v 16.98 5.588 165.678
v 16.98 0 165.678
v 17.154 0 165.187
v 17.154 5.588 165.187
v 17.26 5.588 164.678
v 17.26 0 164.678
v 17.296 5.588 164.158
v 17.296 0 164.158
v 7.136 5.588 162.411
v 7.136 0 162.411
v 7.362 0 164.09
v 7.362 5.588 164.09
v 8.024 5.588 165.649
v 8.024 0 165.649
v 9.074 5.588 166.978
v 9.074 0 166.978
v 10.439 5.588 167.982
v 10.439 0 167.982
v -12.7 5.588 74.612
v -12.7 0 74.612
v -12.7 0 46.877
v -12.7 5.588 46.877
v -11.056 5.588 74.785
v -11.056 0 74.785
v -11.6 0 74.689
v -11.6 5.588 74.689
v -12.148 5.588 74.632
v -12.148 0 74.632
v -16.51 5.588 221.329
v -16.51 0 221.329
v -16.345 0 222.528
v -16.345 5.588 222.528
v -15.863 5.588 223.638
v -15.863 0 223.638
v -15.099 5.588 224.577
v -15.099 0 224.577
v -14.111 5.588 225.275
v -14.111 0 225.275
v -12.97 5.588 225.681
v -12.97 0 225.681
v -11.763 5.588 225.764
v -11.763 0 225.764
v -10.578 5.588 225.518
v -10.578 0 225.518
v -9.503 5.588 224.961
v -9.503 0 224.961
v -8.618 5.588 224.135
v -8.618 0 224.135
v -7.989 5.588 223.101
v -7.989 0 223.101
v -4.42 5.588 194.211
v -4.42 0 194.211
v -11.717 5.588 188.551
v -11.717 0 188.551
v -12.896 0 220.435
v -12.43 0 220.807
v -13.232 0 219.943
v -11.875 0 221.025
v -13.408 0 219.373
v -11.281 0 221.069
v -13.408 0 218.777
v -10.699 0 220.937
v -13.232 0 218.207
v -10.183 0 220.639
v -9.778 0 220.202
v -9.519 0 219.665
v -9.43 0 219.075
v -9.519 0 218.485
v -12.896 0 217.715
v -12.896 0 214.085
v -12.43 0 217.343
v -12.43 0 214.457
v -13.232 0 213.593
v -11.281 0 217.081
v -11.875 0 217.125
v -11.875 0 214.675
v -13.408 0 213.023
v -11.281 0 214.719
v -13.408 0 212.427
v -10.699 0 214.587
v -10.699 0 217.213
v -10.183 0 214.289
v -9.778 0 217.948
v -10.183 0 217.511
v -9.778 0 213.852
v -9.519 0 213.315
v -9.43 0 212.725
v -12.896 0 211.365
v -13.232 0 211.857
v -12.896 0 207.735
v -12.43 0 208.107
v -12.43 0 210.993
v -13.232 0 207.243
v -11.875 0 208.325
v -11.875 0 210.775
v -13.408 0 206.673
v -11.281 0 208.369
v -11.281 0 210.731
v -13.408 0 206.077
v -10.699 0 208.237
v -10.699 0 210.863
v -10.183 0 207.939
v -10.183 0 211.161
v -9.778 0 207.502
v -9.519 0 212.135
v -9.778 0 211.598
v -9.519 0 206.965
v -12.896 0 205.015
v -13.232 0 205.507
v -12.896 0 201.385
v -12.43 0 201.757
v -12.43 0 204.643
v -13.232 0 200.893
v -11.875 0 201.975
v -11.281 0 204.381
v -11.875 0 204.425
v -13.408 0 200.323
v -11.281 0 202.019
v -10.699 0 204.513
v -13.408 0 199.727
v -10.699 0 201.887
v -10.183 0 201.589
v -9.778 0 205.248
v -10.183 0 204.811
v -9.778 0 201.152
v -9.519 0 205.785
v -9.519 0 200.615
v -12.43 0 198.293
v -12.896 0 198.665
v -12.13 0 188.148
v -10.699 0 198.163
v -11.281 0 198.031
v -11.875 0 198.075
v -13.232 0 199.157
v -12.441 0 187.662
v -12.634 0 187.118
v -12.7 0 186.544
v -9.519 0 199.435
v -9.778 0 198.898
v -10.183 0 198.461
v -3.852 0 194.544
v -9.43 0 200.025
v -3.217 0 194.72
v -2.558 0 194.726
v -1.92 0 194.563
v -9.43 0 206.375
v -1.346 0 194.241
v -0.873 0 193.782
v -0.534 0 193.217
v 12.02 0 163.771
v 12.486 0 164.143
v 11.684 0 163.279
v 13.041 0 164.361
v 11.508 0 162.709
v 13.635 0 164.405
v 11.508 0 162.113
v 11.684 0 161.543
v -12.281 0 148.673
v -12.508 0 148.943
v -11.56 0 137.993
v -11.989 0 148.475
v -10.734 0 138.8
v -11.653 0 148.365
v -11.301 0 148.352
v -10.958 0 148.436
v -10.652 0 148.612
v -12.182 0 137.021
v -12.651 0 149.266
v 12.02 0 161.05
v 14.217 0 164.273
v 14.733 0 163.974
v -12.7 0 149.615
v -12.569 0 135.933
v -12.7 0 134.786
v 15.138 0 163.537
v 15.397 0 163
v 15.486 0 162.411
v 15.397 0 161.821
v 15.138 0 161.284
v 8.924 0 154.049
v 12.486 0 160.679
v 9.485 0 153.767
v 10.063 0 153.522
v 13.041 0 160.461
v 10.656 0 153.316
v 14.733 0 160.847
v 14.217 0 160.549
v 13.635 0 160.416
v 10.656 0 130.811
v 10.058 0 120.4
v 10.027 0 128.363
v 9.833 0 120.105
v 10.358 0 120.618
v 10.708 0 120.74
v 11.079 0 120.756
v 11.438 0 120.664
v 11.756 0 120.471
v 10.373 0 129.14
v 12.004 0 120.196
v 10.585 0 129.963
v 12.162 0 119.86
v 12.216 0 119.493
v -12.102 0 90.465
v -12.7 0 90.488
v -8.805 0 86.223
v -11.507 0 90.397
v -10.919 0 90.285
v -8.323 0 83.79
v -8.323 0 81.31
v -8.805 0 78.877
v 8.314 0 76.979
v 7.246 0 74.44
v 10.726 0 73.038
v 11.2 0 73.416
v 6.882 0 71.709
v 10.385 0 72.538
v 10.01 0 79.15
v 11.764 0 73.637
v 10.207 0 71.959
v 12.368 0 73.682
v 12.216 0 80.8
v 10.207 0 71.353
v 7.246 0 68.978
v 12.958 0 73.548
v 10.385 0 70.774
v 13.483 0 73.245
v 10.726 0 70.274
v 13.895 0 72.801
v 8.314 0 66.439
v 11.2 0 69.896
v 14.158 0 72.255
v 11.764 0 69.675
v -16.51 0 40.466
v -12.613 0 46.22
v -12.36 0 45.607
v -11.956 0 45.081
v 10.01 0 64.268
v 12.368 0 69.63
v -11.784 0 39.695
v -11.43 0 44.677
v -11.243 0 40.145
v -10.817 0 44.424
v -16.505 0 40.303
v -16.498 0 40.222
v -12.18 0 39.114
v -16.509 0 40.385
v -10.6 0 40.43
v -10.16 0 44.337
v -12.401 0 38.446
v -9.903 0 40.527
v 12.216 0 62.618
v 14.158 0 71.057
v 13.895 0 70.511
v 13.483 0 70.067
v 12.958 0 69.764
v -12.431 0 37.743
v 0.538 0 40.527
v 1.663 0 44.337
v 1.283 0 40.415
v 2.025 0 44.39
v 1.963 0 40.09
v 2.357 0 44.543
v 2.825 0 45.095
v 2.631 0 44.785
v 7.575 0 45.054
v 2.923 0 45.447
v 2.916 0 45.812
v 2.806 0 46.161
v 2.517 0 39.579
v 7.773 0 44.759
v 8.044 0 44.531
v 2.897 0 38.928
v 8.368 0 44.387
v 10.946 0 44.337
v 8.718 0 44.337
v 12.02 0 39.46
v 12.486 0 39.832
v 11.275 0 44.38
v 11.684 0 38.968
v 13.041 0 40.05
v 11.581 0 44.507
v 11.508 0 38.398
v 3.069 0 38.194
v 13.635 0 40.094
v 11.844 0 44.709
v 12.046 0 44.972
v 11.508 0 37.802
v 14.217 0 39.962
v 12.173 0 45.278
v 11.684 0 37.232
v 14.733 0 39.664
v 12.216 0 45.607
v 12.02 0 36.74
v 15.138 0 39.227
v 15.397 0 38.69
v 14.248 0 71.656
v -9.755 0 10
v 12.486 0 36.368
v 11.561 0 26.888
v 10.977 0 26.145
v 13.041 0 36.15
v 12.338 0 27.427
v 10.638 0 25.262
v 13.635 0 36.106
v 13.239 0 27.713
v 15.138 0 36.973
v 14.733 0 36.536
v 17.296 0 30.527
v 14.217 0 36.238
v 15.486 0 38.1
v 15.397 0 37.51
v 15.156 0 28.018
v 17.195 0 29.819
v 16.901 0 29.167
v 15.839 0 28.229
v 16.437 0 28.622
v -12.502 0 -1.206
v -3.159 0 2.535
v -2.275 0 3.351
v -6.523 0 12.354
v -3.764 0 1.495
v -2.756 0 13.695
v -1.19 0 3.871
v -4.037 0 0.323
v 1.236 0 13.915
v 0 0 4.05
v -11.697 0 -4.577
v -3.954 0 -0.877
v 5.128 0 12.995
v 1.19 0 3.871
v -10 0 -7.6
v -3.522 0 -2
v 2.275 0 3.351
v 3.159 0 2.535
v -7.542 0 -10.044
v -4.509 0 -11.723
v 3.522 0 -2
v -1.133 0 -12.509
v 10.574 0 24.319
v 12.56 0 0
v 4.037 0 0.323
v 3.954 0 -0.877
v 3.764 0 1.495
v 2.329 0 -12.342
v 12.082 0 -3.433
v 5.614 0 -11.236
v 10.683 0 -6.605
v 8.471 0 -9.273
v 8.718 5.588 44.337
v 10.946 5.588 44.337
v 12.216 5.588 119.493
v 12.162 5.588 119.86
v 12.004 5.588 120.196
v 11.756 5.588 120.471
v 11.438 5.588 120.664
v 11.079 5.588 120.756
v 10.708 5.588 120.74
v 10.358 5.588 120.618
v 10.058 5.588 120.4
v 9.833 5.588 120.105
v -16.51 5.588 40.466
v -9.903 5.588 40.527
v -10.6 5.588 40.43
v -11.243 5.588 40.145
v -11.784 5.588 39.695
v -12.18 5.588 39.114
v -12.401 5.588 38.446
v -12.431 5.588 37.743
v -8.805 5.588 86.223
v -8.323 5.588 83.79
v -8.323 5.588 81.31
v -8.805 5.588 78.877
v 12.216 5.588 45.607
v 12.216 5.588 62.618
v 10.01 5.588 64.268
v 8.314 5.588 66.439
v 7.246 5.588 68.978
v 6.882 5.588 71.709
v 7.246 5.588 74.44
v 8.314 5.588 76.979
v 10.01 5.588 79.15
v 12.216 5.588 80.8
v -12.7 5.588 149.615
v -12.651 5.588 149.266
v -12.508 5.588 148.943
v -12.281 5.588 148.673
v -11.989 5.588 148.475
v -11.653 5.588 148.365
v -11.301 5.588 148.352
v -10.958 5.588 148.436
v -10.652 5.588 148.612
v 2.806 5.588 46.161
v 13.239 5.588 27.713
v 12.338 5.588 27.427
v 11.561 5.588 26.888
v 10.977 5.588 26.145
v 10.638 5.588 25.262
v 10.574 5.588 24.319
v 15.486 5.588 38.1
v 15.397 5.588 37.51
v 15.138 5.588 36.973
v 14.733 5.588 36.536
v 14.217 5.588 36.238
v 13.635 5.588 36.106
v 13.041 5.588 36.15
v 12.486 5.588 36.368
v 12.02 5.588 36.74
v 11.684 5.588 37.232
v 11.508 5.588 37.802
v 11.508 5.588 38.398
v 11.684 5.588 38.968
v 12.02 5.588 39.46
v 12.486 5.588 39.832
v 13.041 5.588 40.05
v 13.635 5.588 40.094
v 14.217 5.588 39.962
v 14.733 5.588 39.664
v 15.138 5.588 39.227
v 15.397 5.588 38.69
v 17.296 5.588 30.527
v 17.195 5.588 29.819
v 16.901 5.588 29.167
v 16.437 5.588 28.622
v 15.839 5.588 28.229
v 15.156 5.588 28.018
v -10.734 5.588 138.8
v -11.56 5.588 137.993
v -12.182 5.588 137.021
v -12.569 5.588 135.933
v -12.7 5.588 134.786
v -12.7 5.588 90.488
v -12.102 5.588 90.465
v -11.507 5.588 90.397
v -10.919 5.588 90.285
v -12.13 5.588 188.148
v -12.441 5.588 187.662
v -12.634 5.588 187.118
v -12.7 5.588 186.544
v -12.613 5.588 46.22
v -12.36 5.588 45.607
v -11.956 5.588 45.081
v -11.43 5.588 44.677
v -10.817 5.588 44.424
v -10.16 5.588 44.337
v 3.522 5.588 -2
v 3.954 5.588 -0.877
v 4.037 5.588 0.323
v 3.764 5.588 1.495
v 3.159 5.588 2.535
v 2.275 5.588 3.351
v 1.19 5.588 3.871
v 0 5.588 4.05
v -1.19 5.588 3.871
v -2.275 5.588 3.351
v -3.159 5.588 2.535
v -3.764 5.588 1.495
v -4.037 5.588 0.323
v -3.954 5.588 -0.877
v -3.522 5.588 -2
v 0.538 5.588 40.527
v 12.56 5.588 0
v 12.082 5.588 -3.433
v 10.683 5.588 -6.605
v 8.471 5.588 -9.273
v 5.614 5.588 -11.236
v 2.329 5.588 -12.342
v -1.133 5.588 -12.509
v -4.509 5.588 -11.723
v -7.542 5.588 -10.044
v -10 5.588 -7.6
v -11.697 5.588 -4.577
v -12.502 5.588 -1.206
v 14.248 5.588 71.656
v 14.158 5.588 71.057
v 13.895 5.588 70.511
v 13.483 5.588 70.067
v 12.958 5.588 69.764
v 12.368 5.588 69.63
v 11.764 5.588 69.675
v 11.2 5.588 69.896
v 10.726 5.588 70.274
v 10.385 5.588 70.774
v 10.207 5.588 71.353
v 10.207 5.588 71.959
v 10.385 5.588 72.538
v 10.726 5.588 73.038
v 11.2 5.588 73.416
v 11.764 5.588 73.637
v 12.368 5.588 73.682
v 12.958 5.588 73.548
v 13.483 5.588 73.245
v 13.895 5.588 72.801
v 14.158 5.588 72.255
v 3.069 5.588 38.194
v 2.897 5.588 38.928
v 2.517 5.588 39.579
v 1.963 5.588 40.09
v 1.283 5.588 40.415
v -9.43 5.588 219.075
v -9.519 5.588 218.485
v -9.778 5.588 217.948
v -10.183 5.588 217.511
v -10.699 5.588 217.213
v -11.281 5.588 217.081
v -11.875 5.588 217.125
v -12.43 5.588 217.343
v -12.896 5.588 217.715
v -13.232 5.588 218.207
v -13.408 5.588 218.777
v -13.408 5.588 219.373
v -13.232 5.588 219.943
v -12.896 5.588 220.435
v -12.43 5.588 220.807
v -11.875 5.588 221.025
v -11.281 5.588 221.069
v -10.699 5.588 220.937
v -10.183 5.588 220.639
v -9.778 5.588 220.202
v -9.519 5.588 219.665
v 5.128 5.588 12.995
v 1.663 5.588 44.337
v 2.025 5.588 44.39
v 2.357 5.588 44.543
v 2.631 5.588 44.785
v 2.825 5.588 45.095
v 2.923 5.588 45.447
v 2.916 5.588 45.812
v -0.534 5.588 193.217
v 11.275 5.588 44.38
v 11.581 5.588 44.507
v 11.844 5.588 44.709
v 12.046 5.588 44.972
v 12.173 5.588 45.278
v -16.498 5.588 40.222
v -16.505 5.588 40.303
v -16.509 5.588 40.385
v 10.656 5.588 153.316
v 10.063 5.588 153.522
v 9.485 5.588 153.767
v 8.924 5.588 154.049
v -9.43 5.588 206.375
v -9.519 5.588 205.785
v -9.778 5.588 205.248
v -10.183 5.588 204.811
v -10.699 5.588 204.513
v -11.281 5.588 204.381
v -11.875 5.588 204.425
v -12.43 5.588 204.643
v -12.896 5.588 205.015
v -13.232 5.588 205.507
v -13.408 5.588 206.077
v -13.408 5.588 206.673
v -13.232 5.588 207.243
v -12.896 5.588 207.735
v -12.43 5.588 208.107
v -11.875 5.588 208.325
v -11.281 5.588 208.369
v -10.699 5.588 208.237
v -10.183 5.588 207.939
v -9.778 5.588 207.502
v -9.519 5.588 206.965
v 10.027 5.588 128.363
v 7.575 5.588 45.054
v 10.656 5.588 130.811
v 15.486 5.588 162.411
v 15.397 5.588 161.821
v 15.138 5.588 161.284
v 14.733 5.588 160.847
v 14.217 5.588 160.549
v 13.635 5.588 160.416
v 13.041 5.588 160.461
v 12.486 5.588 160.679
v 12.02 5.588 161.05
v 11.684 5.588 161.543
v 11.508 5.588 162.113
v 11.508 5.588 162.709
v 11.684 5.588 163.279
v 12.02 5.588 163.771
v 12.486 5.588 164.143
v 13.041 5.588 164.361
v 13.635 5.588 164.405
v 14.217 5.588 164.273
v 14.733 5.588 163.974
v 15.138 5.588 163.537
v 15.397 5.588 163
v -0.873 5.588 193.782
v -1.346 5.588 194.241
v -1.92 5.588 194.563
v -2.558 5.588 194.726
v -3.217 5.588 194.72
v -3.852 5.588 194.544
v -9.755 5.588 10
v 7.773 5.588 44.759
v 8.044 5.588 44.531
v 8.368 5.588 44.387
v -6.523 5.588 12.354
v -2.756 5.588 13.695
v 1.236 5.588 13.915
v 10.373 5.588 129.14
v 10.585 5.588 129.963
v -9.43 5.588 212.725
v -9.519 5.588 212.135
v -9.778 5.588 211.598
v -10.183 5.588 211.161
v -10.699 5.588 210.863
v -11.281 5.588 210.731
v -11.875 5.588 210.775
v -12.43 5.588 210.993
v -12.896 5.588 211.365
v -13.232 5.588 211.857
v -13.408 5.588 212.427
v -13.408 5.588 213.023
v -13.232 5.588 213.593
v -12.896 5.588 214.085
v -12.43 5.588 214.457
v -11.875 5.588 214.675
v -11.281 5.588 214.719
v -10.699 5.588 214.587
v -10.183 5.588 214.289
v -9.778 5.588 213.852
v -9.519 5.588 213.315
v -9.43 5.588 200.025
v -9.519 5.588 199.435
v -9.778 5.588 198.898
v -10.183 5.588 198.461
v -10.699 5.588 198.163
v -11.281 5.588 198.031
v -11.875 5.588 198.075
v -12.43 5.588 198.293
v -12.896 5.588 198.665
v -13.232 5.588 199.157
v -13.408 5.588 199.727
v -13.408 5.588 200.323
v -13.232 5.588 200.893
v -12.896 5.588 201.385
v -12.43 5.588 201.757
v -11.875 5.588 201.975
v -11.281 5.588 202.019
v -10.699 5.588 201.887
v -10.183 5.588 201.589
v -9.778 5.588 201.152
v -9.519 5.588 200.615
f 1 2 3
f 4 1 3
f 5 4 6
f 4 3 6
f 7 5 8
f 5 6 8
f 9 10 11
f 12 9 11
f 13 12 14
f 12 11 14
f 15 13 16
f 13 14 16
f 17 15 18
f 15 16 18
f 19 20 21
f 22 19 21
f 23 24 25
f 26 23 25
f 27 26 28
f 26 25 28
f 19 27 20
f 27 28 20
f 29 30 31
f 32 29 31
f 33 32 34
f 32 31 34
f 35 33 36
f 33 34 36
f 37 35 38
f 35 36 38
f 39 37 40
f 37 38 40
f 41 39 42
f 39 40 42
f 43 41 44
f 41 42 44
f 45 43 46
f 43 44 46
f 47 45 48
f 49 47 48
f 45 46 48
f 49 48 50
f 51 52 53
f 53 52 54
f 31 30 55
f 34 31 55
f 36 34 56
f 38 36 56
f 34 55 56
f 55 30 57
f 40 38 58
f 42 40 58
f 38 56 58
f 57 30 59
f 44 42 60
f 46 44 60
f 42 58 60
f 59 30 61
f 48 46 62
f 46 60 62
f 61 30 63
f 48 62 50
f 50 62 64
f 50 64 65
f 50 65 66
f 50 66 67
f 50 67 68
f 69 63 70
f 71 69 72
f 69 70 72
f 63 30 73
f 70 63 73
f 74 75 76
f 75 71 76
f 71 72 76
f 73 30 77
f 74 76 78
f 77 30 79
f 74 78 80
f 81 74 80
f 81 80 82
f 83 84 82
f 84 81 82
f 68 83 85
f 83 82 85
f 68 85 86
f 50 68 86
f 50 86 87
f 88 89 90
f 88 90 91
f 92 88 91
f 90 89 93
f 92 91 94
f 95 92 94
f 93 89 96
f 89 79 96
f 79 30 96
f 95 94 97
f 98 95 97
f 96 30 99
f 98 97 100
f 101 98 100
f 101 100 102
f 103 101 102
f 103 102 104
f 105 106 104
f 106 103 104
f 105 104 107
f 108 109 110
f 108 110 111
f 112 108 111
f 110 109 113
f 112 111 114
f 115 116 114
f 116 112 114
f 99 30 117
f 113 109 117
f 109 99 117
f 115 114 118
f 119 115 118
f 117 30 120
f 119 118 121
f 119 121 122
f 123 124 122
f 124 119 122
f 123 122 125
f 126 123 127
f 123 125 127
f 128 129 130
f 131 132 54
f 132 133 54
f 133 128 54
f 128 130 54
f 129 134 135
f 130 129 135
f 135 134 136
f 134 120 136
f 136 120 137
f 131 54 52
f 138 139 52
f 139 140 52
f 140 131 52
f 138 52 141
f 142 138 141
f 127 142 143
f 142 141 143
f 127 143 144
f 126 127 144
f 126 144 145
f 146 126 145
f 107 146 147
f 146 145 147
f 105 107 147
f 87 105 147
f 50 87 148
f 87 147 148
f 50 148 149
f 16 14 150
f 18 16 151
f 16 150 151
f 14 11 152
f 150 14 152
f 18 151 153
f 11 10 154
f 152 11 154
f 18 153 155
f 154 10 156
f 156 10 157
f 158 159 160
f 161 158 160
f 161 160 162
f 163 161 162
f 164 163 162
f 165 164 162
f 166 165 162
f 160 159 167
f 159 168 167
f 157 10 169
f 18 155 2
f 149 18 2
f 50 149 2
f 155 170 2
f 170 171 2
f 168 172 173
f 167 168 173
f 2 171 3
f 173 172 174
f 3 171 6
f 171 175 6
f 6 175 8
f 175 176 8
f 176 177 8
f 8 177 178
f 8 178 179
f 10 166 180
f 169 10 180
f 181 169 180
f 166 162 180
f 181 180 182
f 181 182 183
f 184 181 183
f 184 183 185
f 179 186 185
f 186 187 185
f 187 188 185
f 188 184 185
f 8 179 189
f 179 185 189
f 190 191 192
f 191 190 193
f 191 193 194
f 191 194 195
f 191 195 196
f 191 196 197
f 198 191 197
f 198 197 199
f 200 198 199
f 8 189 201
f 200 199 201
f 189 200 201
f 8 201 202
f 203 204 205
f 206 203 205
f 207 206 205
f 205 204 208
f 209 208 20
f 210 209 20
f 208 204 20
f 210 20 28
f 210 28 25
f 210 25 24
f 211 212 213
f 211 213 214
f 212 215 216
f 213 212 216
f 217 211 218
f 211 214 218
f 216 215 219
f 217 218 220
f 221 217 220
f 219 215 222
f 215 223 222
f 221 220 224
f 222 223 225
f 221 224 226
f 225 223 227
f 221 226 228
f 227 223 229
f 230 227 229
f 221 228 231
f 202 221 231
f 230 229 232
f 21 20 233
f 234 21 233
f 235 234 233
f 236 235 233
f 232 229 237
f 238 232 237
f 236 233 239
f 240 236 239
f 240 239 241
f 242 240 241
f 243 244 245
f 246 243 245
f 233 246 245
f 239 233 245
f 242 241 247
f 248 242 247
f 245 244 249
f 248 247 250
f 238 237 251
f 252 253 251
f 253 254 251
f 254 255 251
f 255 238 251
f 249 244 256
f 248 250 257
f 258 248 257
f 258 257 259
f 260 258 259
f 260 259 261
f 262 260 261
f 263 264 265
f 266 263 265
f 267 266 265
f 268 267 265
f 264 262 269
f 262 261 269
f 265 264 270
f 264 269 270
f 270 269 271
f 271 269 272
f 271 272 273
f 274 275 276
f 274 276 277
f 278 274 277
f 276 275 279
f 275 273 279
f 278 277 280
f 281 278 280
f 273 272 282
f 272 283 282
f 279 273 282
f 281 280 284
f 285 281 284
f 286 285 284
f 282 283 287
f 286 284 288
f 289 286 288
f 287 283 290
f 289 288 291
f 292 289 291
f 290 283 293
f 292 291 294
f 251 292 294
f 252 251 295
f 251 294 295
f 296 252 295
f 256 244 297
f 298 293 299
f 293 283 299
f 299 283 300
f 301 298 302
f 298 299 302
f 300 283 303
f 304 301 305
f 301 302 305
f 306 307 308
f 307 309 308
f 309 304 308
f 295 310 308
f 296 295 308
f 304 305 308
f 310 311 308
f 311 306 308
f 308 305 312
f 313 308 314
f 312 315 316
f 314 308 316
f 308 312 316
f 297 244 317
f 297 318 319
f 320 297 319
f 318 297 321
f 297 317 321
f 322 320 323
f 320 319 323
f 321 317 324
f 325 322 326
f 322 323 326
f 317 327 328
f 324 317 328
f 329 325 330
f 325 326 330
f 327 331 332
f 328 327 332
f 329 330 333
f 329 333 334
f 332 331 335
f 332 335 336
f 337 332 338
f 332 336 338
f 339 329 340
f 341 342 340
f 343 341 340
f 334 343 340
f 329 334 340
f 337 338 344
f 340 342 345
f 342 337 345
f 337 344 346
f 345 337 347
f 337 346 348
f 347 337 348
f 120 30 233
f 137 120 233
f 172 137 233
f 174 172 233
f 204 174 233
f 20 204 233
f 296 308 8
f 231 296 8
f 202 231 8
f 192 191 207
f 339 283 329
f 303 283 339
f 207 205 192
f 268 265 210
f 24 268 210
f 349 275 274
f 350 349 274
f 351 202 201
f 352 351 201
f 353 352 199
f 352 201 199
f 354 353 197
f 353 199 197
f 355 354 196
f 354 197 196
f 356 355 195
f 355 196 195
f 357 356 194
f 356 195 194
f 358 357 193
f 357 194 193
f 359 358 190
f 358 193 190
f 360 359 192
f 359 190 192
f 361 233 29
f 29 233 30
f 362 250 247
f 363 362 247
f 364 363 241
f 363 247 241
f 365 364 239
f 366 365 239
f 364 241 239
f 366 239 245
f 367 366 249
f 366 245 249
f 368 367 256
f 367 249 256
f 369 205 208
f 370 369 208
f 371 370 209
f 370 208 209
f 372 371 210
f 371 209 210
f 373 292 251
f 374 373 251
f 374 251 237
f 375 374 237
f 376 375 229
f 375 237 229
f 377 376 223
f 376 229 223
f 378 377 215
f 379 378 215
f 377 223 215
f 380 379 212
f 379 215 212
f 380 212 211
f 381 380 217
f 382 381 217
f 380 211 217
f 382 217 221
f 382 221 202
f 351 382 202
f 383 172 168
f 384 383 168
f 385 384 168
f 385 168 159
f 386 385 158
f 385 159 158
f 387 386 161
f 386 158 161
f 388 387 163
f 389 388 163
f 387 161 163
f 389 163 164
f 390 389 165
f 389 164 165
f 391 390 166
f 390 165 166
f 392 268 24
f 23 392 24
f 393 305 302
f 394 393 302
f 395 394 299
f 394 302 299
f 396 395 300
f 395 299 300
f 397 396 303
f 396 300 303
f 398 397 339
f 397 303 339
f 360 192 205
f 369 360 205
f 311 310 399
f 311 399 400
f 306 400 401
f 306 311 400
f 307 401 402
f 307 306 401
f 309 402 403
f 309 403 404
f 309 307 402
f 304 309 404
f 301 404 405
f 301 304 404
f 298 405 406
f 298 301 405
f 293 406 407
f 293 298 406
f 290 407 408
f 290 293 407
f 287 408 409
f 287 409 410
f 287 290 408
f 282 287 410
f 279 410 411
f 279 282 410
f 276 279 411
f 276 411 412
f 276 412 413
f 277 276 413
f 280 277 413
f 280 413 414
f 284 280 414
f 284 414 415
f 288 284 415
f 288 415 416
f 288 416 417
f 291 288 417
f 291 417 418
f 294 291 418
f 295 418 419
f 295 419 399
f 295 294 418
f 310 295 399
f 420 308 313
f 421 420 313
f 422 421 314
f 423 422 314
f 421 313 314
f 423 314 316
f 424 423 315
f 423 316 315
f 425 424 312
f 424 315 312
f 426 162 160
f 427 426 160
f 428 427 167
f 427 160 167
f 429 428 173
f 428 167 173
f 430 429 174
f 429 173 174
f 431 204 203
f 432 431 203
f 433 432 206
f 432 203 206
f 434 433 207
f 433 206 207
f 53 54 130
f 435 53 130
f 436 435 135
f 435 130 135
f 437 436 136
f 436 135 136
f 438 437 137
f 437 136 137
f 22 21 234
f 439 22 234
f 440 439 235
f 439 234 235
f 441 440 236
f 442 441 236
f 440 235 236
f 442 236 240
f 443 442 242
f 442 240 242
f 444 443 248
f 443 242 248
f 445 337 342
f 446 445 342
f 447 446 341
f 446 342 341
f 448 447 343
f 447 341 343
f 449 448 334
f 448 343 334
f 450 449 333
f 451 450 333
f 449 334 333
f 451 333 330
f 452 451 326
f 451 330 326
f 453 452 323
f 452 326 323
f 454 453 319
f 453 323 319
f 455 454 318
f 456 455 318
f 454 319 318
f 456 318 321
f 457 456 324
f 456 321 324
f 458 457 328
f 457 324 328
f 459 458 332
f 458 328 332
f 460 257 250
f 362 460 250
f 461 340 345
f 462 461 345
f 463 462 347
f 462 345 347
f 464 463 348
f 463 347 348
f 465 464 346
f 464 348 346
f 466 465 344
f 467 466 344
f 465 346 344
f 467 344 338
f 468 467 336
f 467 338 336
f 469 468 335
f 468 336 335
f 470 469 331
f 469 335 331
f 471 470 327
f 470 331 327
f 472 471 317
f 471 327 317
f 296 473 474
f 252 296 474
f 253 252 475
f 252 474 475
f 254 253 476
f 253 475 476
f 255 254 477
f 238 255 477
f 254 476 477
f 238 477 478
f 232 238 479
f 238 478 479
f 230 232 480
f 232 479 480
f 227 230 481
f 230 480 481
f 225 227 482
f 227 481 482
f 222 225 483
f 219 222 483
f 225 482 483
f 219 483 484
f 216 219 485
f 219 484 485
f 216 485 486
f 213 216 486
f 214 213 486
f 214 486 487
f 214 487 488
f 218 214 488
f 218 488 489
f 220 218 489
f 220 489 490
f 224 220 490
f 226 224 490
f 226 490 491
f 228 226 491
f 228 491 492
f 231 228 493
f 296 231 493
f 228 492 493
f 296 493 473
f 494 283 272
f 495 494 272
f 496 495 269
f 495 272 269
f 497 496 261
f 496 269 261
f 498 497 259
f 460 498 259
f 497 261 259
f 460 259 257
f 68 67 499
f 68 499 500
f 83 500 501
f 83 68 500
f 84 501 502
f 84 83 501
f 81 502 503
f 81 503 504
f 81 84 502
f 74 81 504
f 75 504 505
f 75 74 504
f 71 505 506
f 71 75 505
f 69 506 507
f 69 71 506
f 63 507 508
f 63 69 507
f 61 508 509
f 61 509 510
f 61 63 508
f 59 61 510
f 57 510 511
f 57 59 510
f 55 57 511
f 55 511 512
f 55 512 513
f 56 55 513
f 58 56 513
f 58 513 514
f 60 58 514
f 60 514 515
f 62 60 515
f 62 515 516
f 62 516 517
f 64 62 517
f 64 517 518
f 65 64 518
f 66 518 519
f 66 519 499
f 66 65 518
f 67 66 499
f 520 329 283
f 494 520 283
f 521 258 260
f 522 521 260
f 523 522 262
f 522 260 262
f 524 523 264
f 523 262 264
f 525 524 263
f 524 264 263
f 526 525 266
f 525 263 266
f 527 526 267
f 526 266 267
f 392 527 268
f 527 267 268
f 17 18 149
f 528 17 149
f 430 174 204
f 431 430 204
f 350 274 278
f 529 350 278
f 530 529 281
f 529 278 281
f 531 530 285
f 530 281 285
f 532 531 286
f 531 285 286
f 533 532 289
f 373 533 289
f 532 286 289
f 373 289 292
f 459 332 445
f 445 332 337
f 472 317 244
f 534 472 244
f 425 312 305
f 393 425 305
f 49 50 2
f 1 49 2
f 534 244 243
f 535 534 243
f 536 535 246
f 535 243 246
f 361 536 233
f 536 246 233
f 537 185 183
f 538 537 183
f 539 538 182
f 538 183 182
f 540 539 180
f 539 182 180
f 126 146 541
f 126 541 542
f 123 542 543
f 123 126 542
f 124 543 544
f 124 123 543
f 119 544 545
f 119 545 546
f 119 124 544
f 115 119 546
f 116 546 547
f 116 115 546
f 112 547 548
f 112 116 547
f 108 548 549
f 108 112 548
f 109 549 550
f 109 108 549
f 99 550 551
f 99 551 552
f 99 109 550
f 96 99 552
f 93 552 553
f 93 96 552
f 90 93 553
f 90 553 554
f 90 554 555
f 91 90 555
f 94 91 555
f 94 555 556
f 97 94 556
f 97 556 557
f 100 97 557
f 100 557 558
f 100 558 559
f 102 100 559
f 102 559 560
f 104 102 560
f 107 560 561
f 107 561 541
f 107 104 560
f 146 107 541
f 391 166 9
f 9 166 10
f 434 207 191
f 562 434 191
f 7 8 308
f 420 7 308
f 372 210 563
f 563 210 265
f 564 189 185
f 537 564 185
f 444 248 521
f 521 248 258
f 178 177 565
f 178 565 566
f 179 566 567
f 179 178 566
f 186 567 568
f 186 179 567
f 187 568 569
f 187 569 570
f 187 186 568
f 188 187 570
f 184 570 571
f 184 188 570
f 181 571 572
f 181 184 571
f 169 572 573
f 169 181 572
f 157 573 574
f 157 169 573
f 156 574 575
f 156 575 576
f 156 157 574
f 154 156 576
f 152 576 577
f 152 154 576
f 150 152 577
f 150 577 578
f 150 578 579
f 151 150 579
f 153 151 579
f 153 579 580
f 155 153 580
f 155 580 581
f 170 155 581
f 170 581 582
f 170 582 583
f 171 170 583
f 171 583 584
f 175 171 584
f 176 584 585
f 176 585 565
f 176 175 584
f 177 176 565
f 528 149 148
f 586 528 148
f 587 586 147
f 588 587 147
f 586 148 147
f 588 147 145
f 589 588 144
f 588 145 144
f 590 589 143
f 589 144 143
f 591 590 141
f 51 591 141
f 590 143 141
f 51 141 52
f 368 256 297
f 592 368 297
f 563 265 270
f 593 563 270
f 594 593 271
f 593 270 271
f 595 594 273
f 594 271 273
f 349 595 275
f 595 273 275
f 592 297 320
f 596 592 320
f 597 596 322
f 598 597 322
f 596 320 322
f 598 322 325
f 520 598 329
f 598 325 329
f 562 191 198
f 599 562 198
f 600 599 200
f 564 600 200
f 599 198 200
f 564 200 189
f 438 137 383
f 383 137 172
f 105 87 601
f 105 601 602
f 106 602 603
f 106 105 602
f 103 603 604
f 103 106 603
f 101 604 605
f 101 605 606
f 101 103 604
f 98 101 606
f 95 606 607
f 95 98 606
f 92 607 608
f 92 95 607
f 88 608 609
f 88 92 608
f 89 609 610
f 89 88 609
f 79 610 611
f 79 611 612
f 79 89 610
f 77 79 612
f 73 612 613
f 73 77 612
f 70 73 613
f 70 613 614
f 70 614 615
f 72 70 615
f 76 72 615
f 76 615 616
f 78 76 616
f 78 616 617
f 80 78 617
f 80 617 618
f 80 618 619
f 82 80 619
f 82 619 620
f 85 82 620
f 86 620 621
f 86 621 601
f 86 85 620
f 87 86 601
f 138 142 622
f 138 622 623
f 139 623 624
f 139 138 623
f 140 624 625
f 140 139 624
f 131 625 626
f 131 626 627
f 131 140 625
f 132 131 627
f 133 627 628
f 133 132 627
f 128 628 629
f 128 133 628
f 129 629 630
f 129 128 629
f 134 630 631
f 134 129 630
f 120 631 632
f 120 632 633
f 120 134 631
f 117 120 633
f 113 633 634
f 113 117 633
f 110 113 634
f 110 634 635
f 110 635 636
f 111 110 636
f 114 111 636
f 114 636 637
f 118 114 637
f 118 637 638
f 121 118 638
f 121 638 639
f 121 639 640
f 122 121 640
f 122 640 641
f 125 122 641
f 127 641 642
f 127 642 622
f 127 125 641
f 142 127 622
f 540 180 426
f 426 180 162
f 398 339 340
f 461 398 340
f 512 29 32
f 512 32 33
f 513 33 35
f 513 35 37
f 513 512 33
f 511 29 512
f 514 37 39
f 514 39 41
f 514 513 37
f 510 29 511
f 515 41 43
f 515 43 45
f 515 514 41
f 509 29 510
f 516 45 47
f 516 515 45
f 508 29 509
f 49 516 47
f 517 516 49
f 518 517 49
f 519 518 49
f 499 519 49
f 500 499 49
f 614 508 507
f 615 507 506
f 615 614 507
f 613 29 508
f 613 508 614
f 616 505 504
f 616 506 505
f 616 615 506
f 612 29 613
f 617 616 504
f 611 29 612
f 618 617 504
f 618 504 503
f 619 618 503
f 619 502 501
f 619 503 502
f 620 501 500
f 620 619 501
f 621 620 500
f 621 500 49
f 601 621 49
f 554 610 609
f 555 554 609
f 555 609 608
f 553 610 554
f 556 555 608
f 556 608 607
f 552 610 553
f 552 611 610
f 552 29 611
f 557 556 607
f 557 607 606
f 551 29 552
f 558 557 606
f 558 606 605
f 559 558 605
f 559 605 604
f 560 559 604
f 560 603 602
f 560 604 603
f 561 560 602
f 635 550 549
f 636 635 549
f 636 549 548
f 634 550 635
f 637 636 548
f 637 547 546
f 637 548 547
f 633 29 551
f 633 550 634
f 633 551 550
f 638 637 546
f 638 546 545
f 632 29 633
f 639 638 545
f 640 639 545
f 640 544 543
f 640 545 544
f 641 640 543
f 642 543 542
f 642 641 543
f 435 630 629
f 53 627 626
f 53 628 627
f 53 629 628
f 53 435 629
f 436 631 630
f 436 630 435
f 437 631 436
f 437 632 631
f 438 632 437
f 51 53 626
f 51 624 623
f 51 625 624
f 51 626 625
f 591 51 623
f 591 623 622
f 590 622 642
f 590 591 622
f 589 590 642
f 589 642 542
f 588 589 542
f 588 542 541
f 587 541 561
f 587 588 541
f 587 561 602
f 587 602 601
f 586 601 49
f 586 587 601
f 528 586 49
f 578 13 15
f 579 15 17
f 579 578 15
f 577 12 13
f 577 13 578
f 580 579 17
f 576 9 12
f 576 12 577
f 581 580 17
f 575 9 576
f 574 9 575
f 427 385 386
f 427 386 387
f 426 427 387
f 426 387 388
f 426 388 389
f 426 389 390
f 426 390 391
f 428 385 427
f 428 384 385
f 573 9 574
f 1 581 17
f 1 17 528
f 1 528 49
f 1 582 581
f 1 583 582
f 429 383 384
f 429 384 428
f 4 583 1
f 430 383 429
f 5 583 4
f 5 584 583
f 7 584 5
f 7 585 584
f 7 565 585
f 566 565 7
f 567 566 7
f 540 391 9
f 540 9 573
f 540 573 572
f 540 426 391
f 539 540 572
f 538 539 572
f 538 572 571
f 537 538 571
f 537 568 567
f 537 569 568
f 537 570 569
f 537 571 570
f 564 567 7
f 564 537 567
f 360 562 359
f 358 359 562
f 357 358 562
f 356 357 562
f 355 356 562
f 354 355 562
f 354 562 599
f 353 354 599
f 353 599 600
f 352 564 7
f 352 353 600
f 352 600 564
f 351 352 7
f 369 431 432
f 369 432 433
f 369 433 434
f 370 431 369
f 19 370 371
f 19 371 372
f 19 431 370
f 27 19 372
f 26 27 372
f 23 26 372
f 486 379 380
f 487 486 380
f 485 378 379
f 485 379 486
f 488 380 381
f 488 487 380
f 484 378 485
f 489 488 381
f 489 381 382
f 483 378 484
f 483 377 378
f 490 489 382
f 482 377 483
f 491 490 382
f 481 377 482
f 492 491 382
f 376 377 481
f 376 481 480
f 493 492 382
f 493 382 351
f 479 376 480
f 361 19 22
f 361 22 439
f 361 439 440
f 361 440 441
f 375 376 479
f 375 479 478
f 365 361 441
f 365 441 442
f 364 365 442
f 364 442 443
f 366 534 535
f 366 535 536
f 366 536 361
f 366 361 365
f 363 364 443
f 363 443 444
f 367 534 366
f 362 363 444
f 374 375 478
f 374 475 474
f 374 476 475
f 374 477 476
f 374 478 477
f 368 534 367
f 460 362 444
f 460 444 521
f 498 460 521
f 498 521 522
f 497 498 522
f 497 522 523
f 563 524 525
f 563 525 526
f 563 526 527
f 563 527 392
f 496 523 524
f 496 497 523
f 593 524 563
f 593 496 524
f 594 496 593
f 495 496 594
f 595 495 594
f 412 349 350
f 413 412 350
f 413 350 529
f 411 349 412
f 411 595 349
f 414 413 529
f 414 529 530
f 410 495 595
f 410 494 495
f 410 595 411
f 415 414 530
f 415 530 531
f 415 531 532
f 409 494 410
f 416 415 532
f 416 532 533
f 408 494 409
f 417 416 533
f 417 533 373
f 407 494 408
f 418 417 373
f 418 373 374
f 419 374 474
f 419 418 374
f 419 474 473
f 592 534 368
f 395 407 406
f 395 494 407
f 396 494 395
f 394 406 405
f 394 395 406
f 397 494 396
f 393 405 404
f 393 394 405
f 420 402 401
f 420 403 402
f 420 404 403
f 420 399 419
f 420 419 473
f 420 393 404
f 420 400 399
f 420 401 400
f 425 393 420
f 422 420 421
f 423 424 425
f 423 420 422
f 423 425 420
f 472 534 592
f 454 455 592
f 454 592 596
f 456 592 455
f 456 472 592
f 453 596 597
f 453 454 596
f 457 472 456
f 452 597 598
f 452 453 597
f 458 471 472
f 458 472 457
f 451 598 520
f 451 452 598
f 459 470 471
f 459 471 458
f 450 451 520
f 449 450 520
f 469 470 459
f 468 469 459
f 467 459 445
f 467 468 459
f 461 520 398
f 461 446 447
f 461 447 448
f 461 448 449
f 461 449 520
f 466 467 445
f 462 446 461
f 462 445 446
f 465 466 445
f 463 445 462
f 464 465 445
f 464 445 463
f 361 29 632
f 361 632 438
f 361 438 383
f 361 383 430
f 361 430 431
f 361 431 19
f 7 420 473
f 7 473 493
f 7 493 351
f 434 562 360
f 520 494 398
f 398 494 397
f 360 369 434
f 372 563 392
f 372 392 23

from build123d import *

# Parameters (mm, degrees)
SKETCH2_R           = 2
SKETCH2_R_2         = 1.999999991
BOSS_EXTRUDE1_DEPTH = 5.588
SKETCH7_R           = 2.032
CUT_EXTRUDE1_DEPTH  = 5.588


with BuildPart() as part:
    # Sketch2 → Boss-Extrude1 (new body)
    with BuildSketch(Plane(origin=(0, 0, 0), x_dir=(1, 0, 0), z_dir=(0, 1, 0))):
        with BuildLine():
            ThreePointArc((17.295902343, -30.526810701), (16.688093876, -28.878103365), (15.15555913, -28.018449791))
            Line((15.15555913, -28.018449791), (13.238676936, -27.713033224))
            ThreePointArc((13.238676936, -27.713033224), (11.241051513, -26.538356195), (10.573787778, -24.319092227))
            Line((10.573787778, -24.319092227), (12.5603, 0))
            ThreePointArc((12.5603, 0), (0.603657177, 12.545785512), (-12.502275592, 1.2059192))
            Line((-12.502275592, 1.2059192), (-16.498266045, -40.222207921))
            ThreePointArc((-16.498266045, -40.222207921), (-16.507064815, -40.344000039), (-16.51, -40.466074291))
            Line((-16.51, -40.466074291), (-16.51, -221.328861788))
            ThreePointArc((-16.51, -221.328861788), (-12.970187584, -225.680718913), (-7.988667969, -223.101301399))
            Line((-7.988667969, -223.101301399), (16.979901226, -165.677523619))
            ThreePointArc((16.979901226, -165.677523619), (17.216065593, -164.934164738), (17.295902343, -164.158289667))
            Line((17.295902343, -164.158289667), (17.295902343, -30.526810701))
        make_face()
        with Locations((-11.43, -219.075)):
            Circle(SKETCH2_R, mode=Mode.SUBTRACT)
        with Locations((-11.43, -212.725)):
            Circle(SKETCH2_R, mode=Mode.SUBTRACT)
        with Locations((-11.43, -206.375)):
            Circle(SKETCH2_R, mode=Mode.SUBTRACT)
        with Locations((-11.43, -200.025)):
            Circle(SKETCH2_R, mode=Mode.SUBTRACT)
        with BuildLine():
            ThreePointArc((7.135902343, -162.410770806), (8.023611961, -165.648962244), (10.438542905, -167.981776143))
            Line((10.438542905, -167.981776143), (-0.534170778, -193.217289931))
            ThreePointArc((-0.534170778, -193.217289931), (-2.234040931, -194.665234867), (-4.420389569, -194.211381682))
            Line((-4.420389569, -194.211381682), (-11.716886202, -188.551043102))
            ThreePointArc((-11.716886202, -188.551043102), (-12.441018517, -187.661516081), (-12.7, -186.544128716))
            Line((-12.7, -186.544128716), (-12.7, -149.615408258))
            ThreePointArc((-12.7, -149.615408258), (-11.988693683, -148.474898999), (-10.651556899, -148.611951065))
            Line((-10.651556899, -148.611951065), (7.135902343, -162.410770806))
        make_face(mode=Mode.SUBTRACT)
        with BuildLine():
            ThreePointArc((10.656105825, -153.315833936), (9.771695946, -153.639779081), (8.923603828, -154.049487576))
            Line((8.923603828, -154.049487576), (-10.733772403, -138.80005889))
            ThreePointArc((-10.733772403, -138.80005889), (-12.182037035, -137.021004847), (-12.7, -134.786230117))
            Line((-12.7, -134.786230117), (-12.7, -90.4875))
            ThreePointArc((-12.7, -90.4875), (-11.803536501, -90.43671411), (-10.918544548, -90.285006317))
            Line((-10.918544548, -90.285006317), (10.027134635, -128.362607876))
            ThreePointArc((10.027134635, -128.362607876), (10.49635106, -129.547067395), (10.656105825, -130.811024207))
            Line((10.656105825, -130.811024207), (10.656105825, -153.315833936))
        make_face(mode=Mode.SUBTRACT)
        with Locations((13.485902343, -162.410770806)):
            Circle(SKETCH2_R, mode=Mode.SUBTRACT)
        with BuildLine():
            Line((-10.16, -44.337182032), (1.663048834, -44.337182032))
            ThreePointArc((1.663048834, -44.337182032), (2.739129831, -44.932682449), (2.806066447, -46.160725831))
            Line((2.806066447, -46.160725831), (-11.055993219, -74.784618621))
            ThreePointArc((-11.055993219, -74.784618621), (-11.873503915, -74.655646925), (-12.7, -74.6125))
            Line((-12.7, -74.6125), (-12.7, -46.877182032))
            ThreePointArc((-12.7, -46.877182032), (-11.956051224, -45.081130808), (-10.16, -44.337182032))
        make_face(mode=Mode.SUBTRACT)
        with BuildLine():
            ThreePointArc((-9.903213406, -40.527182032), (-11.783508673, -39.694838236), (-12.431479451, -37.743315662))
            Line((-12.431479451, -37.743315662), (-9.755434212, -9.99962016))
            ThreePointArc((-9.755434212, -9.99962016), (-2.756273581, -13.695395429), (5.127655889, -12.99492382))
            Line((5.127655889, -12.99492382), (3.069264048, -38.19397392))
            ThreePointArc((3.069264048, -38.19397392), (2.259083254, -39.854914801), (0.537695935, -40.527182032))
            Line((0.537695935, -40.527182032), (-9.903213406, -40.527182032))
        make_face(mode=Mode.SUBTRACT)
        with BuildLine():
            Line((-3.521718331, 2), (3.521718331, 2))
            ThreePointArc((3.521718331, 2), (0, -4.05), (-3.521718331, 2))
        make_face(mode=Mode.SUBTRACT)
        with BuildLine():
            ThreePointArc((-8.804706991, -86.222769023), (-8.262040897, -82.55), (-8.804706991, -78.877230977))
            Line((-8.804706991, -78.877230977), (7.575478058, -45.053638233))
            ThreePointArc((7.575478058, -45.053638233), (8.043996088, -44.531101035), (8.718495671, -44.337182032))
            Line((8.718495671, -44.337182032), (10.945902343, -44.337182032))
            ThreePointArc((10.945902343, -44.337182032), (11.843927955, -44.70915642), (12.215902343, -45.607182032))
            Line((12.215902343, -45.607182032), (12.215902343, -62.618124667))
            ThreePointArc((12.215902343, -62.618124667), (6.881902343, -71.709053992), (12.215902343, -80.799983318))
            Line((12.215902343, -80.799983318), (12.215902343, -119.492817968))
            ThreePointArc((12.215902343, -119.492817968), (11.261891546, -120.722879277), (9.83314514, -120.104922051))
            Line((9.83314514, -120.104922051), (-8.804706991, -86.222769023))
        make_face(mode=Mode.SUBTRACT)
        with Locations((13.485902343, -38.1)):
            Circle(SKETCH2_R_2, mode=Mode.SUBTRACT)
    extrude(amount=BOSS_EXTRUDE1_DEPTH)

    # Sketch7 → Cut-Extrude1 (cut)
    with BuildSketch(Plane(origin=(0, 5.588, 0), x_dir=(1, 0, 0), z_dir=(0, 1, 0))):
        with Locations((12.215902343, -71.655983318)):
            Circle(SKETCH7_R)
    extrude(amount=-CUT_EXTRUDE1_DEPTH, mode=Mode.SUBTRACT)


solid = part.part
